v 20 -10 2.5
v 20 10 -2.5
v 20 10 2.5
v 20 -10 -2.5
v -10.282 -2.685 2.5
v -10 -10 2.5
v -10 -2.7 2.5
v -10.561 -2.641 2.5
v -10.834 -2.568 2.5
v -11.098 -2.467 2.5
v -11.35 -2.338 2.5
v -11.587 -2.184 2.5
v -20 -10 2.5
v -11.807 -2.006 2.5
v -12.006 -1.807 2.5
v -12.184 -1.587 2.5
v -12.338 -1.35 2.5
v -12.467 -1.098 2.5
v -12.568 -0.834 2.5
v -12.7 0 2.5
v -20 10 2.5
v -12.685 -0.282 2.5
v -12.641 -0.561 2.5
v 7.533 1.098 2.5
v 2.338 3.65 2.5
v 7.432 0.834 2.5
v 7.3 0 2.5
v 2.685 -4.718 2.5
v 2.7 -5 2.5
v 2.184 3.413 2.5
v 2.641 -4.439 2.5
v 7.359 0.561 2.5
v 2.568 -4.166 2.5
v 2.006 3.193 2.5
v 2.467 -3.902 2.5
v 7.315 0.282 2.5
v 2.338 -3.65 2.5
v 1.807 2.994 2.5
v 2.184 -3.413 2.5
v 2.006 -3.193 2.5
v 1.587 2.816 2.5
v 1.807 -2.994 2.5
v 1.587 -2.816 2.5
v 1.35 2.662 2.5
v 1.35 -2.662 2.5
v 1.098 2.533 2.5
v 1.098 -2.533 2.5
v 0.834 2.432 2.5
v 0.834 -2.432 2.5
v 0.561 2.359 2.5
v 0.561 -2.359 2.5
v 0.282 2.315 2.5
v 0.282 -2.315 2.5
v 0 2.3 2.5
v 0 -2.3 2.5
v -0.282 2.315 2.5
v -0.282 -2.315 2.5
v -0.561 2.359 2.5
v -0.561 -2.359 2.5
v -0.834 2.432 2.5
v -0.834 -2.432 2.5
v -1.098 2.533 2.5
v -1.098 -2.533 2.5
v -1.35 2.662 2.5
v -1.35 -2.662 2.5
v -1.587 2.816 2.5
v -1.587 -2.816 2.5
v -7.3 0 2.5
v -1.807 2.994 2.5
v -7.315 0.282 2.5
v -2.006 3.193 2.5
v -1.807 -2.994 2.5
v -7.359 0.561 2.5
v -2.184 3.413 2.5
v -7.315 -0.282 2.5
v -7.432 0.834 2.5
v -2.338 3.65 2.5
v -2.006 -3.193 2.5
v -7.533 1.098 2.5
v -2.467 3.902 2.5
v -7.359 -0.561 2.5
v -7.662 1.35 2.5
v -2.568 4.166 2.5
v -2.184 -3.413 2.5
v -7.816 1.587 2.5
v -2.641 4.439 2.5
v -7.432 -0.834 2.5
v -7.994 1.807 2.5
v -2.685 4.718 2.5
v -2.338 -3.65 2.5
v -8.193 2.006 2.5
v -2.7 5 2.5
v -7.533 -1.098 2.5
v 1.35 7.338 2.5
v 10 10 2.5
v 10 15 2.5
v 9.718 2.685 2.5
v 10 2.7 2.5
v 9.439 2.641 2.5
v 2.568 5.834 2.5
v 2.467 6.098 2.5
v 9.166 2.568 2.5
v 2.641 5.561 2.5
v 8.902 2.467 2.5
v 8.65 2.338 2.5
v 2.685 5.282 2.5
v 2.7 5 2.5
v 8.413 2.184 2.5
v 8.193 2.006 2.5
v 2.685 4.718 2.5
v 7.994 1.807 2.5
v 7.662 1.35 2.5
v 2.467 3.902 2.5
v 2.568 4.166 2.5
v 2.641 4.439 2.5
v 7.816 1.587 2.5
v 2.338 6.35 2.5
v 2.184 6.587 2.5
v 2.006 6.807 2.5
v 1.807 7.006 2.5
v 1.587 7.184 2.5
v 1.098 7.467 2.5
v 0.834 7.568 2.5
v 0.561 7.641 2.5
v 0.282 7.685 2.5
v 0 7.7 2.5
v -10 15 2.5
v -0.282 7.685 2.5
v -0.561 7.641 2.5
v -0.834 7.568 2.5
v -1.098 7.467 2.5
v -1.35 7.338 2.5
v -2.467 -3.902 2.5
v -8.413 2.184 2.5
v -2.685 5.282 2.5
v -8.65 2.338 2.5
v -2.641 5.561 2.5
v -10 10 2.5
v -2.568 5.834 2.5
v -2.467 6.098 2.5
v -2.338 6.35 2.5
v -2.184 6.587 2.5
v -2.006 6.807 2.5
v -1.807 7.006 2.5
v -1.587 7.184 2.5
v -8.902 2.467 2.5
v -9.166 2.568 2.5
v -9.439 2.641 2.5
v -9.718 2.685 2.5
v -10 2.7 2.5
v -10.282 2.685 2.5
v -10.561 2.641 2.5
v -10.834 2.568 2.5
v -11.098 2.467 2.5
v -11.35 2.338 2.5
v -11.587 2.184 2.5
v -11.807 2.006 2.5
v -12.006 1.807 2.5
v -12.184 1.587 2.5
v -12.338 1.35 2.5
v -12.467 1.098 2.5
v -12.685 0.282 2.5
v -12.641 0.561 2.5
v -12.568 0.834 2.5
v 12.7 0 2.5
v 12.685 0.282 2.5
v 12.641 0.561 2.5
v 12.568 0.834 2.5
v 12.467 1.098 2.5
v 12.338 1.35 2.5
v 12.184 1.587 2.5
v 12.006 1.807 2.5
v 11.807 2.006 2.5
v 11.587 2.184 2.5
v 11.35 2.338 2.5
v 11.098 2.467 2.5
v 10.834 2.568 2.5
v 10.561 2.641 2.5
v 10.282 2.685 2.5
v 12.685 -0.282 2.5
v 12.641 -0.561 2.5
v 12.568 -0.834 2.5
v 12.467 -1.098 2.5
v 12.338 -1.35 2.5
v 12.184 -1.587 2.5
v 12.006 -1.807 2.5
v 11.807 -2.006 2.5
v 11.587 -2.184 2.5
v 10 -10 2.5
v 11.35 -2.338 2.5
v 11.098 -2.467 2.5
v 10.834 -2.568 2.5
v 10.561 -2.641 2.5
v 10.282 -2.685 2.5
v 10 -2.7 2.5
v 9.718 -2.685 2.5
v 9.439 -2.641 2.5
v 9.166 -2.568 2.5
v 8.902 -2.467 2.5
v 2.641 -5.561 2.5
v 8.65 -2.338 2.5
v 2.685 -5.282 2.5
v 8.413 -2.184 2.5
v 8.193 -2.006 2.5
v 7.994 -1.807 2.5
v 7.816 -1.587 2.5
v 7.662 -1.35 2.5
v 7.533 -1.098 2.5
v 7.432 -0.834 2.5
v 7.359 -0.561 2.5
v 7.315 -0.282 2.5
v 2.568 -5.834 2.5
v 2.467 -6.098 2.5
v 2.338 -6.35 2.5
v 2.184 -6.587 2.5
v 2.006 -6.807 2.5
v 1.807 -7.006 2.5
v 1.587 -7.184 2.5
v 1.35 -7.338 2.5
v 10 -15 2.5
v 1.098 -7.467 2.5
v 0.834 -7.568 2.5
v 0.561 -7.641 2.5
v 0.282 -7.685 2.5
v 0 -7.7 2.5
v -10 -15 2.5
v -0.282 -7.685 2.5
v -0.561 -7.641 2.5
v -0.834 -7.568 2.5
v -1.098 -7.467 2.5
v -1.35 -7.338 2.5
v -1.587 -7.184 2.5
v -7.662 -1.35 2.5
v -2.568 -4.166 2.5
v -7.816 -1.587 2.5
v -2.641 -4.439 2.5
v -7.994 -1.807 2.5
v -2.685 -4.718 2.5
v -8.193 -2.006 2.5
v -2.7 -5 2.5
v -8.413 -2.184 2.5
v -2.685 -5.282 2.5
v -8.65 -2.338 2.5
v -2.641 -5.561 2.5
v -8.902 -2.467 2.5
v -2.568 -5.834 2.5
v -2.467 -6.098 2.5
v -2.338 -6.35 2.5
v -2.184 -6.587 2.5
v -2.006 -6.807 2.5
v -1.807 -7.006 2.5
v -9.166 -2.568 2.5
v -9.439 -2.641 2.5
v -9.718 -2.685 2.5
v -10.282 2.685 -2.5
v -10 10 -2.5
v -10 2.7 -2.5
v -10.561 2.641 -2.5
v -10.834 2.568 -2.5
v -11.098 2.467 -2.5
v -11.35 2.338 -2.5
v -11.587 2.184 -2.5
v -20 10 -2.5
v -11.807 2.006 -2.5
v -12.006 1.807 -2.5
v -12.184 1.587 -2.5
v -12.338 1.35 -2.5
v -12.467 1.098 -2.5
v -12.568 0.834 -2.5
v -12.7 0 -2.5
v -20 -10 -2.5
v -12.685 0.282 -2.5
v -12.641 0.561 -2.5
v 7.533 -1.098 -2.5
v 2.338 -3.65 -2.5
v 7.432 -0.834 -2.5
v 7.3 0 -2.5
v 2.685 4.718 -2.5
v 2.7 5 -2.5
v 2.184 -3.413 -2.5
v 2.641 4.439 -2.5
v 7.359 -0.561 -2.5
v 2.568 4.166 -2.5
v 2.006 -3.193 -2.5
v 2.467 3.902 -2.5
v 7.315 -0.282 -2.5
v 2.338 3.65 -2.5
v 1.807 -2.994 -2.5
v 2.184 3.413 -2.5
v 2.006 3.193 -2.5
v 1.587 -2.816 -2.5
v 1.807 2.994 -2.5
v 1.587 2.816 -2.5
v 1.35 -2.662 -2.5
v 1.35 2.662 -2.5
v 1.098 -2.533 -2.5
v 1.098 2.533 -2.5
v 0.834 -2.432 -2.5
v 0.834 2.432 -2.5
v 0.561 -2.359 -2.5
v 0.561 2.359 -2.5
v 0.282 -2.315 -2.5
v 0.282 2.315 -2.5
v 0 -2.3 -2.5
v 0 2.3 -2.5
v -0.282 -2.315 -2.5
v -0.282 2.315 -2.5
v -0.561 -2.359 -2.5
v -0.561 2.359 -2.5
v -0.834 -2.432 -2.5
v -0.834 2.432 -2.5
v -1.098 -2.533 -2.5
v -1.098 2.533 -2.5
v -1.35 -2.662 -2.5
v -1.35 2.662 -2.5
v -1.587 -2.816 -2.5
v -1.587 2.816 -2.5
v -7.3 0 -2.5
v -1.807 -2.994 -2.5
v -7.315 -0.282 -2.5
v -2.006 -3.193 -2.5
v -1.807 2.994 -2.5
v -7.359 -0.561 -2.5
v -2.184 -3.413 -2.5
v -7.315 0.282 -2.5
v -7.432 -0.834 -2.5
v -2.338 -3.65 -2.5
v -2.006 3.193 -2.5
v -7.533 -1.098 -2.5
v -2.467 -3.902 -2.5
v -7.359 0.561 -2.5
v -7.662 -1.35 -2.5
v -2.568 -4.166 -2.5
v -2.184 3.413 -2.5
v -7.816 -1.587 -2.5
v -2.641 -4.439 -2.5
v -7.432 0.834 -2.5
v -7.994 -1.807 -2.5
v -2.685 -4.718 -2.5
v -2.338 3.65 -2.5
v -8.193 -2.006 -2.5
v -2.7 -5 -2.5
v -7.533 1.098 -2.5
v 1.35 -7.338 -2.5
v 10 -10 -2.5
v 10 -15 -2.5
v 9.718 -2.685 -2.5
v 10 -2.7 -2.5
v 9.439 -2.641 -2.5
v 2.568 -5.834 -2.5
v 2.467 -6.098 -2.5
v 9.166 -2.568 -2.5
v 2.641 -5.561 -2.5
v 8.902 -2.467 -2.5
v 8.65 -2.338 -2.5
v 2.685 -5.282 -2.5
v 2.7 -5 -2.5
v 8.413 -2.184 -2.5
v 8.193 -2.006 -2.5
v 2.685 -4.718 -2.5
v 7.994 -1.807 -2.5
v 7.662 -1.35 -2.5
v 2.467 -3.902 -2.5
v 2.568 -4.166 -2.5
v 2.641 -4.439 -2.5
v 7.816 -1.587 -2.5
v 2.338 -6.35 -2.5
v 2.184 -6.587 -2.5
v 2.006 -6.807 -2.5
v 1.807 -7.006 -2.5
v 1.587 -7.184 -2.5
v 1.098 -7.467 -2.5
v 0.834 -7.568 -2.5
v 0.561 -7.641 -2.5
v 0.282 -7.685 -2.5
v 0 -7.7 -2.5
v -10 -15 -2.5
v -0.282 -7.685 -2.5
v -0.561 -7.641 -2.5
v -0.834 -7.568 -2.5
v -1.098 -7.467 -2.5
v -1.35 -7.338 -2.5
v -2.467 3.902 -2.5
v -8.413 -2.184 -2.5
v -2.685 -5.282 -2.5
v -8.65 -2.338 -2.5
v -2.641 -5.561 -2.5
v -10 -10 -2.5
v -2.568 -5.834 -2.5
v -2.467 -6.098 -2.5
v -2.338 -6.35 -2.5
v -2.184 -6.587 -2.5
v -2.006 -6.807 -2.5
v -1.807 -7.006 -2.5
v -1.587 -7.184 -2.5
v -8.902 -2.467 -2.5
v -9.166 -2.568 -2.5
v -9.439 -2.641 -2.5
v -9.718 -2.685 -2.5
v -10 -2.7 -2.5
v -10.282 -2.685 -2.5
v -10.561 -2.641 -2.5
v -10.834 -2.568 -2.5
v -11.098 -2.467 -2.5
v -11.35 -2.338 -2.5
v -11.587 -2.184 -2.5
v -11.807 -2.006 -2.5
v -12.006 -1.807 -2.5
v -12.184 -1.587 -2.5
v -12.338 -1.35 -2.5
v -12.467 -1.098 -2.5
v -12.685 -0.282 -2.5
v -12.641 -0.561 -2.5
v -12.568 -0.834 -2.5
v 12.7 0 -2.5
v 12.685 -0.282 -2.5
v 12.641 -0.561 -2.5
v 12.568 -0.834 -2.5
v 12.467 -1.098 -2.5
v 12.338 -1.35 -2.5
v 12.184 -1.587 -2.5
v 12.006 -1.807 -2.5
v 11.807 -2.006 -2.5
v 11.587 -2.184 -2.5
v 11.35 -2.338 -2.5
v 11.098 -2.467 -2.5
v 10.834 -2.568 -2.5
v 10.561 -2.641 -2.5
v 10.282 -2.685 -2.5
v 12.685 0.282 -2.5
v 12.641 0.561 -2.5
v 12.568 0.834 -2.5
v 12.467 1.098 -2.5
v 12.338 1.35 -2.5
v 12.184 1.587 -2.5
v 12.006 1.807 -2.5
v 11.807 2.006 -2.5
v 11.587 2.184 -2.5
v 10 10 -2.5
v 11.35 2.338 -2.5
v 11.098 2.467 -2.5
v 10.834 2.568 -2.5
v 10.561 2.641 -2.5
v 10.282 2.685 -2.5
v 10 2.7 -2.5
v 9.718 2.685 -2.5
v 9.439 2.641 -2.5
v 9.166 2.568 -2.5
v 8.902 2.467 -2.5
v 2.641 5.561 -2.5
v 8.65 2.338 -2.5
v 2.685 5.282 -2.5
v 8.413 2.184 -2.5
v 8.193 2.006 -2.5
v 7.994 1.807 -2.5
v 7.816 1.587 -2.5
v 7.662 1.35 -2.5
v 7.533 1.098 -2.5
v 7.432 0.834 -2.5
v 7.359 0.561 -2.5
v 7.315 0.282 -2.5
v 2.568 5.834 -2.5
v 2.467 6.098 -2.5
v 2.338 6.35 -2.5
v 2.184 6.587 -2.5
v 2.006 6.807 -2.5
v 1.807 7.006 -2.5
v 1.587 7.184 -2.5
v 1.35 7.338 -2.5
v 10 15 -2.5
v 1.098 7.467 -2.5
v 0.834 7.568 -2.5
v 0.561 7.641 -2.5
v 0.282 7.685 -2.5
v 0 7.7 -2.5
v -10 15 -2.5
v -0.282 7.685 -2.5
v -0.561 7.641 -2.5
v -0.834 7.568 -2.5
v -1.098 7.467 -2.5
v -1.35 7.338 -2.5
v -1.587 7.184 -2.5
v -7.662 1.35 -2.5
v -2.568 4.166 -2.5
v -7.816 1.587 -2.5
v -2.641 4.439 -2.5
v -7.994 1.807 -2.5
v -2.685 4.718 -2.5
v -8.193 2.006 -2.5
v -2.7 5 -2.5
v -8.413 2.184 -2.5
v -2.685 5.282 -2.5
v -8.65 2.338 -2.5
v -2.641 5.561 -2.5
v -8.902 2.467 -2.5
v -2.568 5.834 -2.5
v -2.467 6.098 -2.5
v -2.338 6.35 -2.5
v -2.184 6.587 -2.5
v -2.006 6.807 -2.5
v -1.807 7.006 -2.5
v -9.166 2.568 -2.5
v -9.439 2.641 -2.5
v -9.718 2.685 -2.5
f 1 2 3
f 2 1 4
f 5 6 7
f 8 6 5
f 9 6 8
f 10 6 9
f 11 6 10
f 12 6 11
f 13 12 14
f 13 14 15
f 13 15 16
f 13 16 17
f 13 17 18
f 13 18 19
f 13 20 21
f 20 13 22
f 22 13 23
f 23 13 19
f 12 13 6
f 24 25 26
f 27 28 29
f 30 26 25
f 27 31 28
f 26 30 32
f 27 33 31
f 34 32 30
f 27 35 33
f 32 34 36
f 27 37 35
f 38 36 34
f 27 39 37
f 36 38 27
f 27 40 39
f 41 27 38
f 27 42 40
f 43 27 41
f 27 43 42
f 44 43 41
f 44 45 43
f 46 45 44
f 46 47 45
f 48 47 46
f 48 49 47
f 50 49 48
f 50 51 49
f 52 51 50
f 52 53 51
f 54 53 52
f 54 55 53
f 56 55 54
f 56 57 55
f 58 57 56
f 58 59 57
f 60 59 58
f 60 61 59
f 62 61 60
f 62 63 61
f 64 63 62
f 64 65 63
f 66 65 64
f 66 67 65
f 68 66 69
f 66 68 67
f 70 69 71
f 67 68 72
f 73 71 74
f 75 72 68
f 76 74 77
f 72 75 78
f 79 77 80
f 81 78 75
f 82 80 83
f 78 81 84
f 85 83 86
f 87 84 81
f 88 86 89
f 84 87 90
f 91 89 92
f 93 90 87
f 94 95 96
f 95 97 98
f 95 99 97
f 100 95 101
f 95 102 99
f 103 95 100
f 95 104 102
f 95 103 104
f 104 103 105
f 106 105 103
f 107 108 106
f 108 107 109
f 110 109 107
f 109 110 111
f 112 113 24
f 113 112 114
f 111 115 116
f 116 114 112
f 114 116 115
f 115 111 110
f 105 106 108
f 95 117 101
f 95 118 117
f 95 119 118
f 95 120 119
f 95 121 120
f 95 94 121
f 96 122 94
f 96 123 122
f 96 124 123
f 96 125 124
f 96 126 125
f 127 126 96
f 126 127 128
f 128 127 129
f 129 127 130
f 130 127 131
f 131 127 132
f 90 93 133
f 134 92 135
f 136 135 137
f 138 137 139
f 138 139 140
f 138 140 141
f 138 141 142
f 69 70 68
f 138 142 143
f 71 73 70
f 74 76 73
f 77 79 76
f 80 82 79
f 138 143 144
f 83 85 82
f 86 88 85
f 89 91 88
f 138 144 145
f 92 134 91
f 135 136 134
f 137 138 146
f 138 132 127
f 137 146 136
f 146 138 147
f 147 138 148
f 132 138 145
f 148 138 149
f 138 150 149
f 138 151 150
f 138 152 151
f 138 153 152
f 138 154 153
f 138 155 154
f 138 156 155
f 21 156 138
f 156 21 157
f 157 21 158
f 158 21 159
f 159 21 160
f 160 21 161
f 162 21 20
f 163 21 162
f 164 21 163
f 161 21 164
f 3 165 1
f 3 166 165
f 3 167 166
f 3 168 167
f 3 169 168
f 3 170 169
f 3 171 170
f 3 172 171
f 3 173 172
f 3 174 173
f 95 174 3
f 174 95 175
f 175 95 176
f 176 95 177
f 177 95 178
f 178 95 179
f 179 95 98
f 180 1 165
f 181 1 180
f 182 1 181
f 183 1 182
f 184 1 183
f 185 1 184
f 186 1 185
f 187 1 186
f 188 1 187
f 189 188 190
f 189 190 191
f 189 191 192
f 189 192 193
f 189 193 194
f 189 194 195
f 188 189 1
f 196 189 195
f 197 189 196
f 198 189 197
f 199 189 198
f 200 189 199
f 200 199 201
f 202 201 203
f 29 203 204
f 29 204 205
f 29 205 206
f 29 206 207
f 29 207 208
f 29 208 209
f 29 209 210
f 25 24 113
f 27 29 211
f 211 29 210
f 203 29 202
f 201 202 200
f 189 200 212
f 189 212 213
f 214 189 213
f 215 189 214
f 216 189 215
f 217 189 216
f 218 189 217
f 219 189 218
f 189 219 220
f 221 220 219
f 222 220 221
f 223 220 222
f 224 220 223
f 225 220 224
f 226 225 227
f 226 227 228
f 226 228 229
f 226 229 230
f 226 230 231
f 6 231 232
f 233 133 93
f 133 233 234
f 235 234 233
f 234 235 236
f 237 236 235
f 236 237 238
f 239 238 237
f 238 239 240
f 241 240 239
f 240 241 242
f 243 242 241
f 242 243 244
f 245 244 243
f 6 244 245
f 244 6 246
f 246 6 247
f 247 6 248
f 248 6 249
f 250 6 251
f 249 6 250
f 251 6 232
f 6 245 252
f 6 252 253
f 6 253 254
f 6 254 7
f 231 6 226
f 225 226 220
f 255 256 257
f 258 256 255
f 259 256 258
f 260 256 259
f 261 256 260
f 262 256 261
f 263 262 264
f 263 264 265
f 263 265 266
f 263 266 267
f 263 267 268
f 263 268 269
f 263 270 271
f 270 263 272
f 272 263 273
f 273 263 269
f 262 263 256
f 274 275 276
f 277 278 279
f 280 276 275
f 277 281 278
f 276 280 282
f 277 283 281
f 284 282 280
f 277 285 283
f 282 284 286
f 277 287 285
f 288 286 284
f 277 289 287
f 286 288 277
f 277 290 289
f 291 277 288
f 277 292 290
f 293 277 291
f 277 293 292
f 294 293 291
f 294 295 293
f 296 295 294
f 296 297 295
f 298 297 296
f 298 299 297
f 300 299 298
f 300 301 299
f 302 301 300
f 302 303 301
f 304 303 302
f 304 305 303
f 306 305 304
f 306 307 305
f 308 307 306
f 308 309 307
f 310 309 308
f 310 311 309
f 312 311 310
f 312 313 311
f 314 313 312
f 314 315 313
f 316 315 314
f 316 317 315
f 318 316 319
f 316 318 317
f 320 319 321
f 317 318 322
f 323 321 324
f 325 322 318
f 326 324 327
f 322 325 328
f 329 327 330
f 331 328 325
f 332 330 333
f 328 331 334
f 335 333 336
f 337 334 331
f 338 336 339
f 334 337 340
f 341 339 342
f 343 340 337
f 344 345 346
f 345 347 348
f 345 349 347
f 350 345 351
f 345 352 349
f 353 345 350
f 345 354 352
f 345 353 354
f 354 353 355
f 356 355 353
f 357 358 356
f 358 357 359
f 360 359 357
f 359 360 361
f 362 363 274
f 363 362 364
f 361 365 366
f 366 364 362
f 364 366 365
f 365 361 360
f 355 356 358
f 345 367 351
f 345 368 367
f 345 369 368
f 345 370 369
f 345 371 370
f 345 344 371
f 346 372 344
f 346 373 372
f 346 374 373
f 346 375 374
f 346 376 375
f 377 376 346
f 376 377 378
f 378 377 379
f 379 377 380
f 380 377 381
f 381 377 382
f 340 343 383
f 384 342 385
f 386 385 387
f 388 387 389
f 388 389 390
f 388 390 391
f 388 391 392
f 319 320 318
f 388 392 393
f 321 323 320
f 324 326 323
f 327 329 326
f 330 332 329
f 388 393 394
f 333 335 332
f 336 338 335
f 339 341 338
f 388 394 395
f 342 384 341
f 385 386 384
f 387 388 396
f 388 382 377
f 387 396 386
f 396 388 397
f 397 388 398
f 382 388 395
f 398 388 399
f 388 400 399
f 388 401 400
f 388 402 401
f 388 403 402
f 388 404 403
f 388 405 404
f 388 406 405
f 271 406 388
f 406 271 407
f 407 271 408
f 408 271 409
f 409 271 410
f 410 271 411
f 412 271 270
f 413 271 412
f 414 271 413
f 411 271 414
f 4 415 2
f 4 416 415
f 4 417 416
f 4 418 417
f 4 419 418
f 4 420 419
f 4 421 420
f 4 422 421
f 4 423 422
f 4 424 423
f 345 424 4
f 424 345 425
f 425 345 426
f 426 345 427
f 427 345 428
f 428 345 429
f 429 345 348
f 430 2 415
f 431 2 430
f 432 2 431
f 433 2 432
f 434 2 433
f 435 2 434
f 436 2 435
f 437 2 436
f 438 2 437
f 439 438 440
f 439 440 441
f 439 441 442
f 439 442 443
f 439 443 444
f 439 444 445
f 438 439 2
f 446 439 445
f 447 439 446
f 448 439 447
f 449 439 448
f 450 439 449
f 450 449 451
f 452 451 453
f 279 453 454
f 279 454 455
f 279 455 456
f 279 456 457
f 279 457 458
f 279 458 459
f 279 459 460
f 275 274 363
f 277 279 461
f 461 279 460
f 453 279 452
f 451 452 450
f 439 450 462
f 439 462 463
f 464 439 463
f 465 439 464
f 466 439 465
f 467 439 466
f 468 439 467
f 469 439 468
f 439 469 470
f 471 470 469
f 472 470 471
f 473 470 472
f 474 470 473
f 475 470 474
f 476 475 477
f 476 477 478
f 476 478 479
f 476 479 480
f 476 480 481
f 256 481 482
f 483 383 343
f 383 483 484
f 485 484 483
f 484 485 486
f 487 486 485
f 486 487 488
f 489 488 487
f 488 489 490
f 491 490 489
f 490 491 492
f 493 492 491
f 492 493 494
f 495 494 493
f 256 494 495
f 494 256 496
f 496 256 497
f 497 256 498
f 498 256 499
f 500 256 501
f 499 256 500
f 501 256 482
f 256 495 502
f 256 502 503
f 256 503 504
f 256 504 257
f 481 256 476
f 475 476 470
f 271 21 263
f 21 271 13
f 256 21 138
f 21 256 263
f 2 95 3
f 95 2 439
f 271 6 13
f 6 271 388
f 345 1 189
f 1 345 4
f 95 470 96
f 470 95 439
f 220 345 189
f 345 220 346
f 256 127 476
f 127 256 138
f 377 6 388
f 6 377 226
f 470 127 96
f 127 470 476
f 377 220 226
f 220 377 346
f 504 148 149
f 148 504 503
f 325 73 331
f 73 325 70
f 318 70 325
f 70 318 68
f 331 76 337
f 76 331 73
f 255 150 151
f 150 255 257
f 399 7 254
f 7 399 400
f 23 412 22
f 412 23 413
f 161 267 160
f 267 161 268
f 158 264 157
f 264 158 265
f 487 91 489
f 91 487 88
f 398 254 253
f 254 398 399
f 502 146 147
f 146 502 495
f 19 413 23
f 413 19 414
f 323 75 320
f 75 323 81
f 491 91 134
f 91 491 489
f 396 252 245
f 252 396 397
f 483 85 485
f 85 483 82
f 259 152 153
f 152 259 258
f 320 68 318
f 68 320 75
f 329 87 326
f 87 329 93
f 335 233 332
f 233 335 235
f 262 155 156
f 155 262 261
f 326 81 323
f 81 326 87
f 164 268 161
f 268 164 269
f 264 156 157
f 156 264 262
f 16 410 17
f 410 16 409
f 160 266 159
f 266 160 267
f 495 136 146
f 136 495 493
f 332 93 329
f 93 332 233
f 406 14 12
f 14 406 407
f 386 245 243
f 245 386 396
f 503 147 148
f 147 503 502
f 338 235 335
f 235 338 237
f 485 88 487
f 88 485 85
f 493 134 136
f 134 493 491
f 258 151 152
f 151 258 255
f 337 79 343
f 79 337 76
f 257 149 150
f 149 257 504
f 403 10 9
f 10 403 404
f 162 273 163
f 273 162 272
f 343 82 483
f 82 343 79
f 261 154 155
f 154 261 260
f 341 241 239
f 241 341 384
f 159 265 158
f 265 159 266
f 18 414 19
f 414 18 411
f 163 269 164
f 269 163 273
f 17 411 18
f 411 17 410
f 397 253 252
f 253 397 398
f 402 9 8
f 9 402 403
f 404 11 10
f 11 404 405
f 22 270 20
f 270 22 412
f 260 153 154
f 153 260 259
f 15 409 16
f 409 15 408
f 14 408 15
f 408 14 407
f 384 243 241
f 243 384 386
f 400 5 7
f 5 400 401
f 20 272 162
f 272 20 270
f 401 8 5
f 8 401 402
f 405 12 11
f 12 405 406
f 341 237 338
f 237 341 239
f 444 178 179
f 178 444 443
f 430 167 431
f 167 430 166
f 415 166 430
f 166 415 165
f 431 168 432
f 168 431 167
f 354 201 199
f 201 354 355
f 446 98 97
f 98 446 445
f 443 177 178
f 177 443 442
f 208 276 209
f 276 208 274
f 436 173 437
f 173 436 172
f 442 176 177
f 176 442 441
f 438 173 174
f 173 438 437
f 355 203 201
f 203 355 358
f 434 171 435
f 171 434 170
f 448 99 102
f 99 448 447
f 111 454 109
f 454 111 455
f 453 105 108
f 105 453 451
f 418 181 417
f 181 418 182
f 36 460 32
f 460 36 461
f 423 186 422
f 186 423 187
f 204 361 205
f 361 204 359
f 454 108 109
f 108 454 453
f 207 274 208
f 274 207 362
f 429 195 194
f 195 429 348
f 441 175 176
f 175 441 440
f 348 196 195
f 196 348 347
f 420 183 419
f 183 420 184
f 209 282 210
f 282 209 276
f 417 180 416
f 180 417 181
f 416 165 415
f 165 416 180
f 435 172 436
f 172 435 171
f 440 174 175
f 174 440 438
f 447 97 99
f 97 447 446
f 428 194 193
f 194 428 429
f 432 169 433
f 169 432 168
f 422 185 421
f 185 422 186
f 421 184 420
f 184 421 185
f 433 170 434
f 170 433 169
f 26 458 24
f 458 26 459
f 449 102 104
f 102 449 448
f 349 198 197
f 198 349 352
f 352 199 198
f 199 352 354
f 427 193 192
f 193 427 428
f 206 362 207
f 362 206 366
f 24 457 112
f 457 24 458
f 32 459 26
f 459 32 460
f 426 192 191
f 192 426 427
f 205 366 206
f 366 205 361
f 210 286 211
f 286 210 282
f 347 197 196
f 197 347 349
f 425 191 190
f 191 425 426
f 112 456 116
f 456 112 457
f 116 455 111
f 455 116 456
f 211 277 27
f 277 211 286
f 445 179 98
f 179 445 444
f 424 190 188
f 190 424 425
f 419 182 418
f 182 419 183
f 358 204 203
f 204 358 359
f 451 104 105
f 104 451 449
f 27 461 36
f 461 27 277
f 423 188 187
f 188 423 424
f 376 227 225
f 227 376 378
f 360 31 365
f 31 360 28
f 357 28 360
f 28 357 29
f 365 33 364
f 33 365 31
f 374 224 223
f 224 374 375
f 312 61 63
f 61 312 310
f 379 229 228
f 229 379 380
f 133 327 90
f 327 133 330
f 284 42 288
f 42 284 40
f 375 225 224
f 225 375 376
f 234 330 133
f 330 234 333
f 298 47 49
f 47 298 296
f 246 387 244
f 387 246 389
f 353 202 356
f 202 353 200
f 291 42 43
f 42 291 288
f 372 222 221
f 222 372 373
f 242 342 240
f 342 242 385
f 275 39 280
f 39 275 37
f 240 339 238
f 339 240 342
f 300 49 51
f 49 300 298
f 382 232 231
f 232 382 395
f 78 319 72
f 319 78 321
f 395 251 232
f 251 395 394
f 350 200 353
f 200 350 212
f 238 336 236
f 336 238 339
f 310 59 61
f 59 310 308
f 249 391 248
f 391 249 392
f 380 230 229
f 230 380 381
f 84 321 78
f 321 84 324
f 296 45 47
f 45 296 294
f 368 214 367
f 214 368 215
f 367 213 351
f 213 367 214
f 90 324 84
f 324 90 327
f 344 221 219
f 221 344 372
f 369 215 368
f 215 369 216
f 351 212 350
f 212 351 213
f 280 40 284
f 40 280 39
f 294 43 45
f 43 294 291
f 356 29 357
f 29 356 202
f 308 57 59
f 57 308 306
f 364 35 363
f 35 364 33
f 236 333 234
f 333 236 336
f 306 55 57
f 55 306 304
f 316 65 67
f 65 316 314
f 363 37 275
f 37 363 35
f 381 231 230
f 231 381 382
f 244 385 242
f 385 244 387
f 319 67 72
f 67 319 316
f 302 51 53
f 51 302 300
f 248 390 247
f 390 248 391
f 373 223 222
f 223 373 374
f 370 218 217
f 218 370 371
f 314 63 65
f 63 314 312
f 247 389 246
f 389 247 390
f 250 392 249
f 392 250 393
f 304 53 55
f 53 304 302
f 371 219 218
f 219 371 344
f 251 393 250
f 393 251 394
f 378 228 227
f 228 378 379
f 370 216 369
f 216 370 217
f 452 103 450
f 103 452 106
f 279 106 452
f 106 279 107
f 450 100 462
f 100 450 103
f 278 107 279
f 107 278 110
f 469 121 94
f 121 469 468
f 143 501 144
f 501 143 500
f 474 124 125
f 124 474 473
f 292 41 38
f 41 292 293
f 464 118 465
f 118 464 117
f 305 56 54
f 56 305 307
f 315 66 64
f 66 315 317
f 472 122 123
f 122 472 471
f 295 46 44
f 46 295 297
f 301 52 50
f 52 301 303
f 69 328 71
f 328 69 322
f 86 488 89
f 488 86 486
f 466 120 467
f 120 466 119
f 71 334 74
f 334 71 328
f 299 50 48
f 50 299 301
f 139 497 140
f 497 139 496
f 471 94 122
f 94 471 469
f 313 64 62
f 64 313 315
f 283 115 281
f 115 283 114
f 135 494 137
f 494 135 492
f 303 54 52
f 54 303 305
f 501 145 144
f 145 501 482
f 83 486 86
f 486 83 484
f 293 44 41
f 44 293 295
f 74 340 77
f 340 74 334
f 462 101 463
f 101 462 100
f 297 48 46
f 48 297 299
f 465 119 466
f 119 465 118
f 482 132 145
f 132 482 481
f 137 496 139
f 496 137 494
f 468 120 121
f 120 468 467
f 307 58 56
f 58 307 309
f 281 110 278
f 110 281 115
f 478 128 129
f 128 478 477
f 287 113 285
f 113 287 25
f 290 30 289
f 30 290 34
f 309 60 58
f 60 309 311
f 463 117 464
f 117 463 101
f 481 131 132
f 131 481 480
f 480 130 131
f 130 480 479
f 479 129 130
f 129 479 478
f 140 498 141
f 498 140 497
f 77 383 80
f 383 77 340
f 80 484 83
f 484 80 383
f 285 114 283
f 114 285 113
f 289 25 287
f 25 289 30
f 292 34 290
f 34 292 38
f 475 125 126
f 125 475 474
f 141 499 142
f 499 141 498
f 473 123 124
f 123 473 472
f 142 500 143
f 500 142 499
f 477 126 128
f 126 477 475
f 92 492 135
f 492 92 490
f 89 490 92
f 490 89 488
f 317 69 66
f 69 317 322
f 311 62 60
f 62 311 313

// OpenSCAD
// T-shaped mounting plate.
$fn = 60;
eps = 0.02;
stem_l = 40;
arm_l = 30;
width = 20;
thickness = 5;
difference() {
    union() { cube([stem_l,width,thickness],center=true); cube([width,arm_l,thickness],center=true); }
    for (p=[[-stem_l/2+10,0],[stem_l/2-10,0],[0,-arm_l/2+10],[0,arm_l/2-10]]) translate([p[0],p[1],-thickness/2-eps]) cylinder(d=5.4,h=thickness+2*eps);
}
